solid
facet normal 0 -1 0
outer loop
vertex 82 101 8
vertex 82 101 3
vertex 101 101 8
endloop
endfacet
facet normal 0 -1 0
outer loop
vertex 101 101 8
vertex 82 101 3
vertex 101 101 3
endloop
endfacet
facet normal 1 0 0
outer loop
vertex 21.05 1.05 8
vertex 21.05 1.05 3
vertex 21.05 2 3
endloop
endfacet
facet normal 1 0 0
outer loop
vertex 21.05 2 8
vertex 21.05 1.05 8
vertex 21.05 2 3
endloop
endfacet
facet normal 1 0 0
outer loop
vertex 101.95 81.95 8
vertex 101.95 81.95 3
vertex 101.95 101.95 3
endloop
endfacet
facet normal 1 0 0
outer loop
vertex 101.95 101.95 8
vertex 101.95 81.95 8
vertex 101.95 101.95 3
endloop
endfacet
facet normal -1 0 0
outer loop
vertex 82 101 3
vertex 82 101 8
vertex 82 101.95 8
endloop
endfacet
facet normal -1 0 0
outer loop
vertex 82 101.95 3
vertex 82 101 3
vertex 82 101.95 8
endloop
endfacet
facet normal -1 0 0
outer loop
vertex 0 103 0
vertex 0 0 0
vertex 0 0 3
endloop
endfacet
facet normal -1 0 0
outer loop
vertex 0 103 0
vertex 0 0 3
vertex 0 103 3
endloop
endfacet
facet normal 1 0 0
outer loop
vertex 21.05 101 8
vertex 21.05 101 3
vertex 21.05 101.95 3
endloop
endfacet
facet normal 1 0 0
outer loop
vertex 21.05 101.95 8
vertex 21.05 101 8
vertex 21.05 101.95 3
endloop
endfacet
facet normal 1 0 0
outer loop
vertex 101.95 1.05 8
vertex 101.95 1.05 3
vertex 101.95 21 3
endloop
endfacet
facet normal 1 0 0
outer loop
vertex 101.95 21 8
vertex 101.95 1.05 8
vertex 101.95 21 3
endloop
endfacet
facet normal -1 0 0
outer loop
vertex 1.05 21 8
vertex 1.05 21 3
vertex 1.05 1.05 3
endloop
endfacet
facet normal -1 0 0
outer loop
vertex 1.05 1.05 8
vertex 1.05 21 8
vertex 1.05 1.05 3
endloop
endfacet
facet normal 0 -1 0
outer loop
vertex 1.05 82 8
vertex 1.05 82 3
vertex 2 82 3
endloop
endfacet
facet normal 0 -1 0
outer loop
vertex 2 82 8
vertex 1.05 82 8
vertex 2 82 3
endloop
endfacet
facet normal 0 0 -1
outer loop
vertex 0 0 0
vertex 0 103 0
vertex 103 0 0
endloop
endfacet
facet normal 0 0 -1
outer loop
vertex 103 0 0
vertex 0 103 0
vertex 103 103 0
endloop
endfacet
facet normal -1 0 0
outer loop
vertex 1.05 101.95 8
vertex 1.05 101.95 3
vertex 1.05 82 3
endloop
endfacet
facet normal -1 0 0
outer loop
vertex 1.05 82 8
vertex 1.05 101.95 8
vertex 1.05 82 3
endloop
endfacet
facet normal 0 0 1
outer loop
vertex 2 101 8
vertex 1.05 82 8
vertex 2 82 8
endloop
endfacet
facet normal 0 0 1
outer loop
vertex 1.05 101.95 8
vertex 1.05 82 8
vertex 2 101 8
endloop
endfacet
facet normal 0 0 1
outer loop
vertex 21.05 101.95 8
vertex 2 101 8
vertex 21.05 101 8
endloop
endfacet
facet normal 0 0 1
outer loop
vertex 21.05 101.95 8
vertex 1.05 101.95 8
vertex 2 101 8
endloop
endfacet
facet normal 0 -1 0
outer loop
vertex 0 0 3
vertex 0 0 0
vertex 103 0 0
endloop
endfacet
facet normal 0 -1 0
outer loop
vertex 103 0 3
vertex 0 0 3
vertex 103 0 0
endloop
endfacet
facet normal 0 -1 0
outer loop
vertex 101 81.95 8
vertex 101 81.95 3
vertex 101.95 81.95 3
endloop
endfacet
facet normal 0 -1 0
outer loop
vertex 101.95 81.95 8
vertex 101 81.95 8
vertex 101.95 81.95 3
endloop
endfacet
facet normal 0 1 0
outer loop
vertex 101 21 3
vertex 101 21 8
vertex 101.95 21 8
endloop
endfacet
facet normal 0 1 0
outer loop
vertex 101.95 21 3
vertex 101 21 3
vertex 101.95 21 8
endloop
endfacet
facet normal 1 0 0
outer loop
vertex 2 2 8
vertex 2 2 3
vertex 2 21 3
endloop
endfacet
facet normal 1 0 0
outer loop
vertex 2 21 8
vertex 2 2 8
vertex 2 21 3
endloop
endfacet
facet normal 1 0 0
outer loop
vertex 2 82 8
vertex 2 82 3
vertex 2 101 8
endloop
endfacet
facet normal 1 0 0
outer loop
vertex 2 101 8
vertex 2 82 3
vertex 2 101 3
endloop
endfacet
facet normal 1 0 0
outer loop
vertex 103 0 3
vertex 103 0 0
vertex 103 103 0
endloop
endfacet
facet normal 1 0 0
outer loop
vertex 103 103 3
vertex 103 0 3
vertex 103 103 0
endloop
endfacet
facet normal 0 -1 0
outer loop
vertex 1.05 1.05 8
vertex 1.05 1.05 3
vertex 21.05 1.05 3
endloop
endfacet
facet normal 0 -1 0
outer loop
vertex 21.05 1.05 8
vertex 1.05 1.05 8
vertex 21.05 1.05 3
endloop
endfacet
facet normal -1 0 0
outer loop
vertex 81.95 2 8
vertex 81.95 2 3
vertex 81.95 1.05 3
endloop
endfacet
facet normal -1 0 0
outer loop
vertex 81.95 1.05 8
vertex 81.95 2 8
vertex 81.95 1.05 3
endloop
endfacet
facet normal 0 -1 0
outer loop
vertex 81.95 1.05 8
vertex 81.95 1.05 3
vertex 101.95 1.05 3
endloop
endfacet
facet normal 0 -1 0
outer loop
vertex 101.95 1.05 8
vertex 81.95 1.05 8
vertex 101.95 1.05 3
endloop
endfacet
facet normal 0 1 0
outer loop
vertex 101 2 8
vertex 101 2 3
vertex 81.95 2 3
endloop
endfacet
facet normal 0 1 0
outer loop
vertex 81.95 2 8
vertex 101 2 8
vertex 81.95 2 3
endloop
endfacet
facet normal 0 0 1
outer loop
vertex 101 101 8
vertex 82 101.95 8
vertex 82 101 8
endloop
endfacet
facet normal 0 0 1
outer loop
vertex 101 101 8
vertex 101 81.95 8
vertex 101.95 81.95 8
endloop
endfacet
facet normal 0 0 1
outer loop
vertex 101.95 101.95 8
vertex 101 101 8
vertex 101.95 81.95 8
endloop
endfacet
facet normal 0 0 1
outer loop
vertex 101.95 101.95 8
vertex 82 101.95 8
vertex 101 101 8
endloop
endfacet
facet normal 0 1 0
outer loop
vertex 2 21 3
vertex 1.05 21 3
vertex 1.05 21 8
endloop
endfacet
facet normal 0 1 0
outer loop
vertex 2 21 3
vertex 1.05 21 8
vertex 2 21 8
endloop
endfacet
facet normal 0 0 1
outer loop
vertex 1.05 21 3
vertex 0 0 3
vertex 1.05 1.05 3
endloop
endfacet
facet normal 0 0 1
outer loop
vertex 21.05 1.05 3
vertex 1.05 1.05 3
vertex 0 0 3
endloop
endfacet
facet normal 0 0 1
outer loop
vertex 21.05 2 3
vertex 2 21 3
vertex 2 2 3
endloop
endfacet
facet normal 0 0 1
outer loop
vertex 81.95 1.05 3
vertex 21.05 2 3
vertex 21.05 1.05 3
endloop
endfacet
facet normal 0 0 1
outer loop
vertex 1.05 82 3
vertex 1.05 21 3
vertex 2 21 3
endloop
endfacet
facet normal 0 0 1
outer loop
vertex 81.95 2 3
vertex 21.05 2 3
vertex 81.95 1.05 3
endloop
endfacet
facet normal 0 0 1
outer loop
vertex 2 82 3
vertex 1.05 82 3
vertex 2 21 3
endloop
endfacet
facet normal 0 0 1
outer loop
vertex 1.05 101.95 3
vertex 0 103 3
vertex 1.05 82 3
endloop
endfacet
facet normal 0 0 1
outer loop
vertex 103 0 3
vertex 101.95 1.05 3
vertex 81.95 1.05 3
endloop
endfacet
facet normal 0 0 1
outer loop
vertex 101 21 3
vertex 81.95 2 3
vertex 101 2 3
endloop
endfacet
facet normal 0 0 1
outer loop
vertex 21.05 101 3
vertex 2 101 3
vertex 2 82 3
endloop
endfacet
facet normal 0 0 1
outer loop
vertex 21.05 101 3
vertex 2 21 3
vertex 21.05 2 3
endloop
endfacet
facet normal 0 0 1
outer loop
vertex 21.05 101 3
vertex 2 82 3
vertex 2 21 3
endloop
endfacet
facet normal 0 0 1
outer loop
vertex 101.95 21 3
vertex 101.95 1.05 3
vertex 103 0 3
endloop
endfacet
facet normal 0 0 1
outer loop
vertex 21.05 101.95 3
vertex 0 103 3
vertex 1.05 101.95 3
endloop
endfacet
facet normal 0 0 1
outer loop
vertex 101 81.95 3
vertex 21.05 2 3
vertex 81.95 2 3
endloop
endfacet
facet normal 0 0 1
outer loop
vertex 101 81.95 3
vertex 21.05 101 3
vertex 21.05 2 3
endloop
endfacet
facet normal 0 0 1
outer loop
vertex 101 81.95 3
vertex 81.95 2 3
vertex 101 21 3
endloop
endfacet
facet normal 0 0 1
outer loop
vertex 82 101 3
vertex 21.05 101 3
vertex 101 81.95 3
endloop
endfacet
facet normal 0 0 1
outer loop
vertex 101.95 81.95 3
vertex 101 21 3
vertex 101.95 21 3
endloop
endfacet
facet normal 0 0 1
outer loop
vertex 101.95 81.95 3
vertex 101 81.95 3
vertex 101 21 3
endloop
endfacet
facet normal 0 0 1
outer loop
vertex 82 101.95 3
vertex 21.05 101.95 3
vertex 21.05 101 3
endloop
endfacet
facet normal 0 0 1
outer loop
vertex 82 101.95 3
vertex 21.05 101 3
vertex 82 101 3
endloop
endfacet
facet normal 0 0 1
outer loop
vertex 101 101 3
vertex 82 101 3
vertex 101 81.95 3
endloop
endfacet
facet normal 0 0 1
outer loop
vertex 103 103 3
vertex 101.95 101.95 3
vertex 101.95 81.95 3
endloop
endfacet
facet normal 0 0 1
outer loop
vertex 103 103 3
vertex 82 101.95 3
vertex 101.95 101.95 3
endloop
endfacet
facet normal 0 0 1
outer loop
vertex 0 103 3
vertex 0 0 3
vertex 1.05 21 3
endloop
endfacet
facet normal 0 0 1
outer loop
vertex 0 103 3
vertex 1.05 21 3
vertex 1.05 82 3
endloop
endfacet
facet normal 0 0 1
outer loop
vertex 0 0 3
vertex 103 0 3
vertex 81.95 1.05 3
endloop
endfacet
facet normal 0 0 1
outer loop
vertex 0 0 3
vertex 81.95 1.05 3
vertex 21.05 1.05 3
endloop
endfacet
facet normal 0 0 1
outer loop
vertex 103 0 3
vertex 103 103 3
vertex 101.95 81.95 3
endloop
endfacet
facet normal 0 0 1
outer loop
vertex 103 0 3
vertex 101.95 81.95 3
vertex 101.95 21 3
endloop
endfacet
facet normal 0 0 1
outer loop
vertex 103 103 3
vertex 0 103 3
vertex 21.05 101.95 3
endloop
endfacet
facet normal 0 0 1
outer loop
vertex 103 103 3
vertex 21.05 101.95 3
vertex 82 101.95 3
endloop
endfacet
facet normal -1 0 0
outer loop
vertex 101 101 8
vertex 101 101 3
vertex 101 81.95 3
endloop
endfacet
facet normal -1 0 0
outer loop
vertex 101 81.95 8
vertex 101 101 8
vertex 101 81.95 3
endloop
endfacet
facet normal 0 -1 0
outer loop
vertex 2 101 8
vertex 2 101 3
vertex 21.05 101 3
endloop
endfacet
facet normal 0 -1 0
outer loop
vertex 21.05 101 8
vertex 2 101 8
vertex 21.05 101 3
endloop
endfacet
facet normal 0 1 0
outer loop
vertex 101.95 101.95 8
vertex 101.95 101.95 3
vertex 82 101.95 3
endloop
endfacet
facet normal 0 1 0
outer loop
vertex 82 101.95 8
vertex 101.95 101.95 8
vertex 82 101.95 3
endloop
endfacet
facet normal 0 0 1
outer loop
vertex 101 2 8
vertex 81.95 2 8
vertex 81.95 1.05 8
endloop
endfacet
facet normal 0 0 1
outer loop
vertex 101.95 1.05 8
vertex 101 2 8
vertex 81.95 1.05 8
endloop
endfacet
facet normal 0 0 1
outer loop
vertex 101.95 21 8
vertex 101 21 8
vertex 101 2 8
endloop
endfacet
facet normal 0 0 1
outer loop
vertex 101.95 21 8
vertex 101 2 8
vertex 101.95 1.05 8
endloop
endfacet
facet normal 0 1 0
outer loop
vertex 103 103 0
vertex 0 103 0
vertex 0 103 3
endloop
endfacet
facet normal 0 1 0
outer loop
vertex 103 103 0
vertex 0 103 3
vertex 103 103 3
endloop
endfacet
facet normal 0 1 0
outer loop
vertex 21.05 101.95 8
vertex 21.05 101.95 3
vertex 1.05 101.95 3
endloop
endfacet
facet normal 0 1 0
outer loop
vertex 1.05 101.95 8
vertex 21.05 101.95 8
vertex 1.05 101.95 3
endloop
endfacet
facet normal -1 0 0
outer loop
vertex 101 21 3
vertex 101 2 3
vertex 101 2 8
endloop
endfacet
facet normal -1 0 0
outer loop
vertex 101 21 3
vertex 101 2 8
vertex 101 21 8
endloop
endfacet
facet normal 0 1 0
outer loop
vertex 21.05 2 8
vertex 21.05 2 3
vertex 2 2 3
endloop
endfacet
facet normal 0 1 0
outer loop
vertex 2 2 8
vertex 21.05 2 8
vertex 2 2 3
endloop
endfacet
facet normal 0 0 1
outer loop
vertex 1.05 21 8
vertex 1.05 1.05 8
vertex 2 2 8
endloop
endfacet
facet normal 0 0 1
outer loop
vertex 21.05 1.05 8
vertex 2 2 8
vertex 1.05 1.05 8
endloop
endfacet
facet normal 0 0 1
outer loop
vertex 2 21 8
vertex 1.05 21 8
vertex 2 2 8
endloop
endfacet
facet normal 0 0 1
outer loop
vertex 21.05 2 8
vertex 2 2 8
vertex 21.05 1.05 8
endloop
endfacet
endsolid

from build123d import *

# Parameters (mm, degrees)
F0_W     = 103
F0_H     = 103
F1_DEPTH = 3
F2_W     = 0.95
F2_H     = 19
F2_W_2   = 19
F2_H_2   = 0.95
F3_DEPTH = 5


with BuildPart() as f1:
    # F0 (on Top) → F1 (new body)
    with BuildSketch(Plane.XY):
        with Locations((51.5, 51.5)):
            Rectangle(F0_W, F0_H)
    extrude(amount=F1_DEPTH)

    # F2 (on face) → F3 (join)
    with BuildSketch(Plane.XY.offset(3)):
        with Locations((1.525, 11.5)):
            Rectangle(F2_W, F2_H)
        Polygon((2, 2), (1.05, 2), (1.05, 1.05), (21.05, 1.05), (21.05, 2), align=None)
        Polygon((101, 2), (81.95, 2), (81.95, 1.05), (101.95, 1.05), (101.95, 2), align=None)
        with Locations((101.475, 11.5)):
            Rectangle(F2_W, F2_H)
        Polygon((101.95, 81.95), (101.95, 101.95), (101, 101.95), (101, 101), (101, 81.95), align=None)
        with Locations((91.5, 101.475)):
            Rectangle(F2_W_2, F2_H_2)
        Polygon((21.05, 101.95), (1.05, 101.95), (1.05, 101), (2, 101), (21.05, 101), align=None)
        with Locations((1.525, 91.5)):
            Rectangle(F2_W, F2_H)
    extrude(amount=F3_DEPTH)


solid = f1.part
